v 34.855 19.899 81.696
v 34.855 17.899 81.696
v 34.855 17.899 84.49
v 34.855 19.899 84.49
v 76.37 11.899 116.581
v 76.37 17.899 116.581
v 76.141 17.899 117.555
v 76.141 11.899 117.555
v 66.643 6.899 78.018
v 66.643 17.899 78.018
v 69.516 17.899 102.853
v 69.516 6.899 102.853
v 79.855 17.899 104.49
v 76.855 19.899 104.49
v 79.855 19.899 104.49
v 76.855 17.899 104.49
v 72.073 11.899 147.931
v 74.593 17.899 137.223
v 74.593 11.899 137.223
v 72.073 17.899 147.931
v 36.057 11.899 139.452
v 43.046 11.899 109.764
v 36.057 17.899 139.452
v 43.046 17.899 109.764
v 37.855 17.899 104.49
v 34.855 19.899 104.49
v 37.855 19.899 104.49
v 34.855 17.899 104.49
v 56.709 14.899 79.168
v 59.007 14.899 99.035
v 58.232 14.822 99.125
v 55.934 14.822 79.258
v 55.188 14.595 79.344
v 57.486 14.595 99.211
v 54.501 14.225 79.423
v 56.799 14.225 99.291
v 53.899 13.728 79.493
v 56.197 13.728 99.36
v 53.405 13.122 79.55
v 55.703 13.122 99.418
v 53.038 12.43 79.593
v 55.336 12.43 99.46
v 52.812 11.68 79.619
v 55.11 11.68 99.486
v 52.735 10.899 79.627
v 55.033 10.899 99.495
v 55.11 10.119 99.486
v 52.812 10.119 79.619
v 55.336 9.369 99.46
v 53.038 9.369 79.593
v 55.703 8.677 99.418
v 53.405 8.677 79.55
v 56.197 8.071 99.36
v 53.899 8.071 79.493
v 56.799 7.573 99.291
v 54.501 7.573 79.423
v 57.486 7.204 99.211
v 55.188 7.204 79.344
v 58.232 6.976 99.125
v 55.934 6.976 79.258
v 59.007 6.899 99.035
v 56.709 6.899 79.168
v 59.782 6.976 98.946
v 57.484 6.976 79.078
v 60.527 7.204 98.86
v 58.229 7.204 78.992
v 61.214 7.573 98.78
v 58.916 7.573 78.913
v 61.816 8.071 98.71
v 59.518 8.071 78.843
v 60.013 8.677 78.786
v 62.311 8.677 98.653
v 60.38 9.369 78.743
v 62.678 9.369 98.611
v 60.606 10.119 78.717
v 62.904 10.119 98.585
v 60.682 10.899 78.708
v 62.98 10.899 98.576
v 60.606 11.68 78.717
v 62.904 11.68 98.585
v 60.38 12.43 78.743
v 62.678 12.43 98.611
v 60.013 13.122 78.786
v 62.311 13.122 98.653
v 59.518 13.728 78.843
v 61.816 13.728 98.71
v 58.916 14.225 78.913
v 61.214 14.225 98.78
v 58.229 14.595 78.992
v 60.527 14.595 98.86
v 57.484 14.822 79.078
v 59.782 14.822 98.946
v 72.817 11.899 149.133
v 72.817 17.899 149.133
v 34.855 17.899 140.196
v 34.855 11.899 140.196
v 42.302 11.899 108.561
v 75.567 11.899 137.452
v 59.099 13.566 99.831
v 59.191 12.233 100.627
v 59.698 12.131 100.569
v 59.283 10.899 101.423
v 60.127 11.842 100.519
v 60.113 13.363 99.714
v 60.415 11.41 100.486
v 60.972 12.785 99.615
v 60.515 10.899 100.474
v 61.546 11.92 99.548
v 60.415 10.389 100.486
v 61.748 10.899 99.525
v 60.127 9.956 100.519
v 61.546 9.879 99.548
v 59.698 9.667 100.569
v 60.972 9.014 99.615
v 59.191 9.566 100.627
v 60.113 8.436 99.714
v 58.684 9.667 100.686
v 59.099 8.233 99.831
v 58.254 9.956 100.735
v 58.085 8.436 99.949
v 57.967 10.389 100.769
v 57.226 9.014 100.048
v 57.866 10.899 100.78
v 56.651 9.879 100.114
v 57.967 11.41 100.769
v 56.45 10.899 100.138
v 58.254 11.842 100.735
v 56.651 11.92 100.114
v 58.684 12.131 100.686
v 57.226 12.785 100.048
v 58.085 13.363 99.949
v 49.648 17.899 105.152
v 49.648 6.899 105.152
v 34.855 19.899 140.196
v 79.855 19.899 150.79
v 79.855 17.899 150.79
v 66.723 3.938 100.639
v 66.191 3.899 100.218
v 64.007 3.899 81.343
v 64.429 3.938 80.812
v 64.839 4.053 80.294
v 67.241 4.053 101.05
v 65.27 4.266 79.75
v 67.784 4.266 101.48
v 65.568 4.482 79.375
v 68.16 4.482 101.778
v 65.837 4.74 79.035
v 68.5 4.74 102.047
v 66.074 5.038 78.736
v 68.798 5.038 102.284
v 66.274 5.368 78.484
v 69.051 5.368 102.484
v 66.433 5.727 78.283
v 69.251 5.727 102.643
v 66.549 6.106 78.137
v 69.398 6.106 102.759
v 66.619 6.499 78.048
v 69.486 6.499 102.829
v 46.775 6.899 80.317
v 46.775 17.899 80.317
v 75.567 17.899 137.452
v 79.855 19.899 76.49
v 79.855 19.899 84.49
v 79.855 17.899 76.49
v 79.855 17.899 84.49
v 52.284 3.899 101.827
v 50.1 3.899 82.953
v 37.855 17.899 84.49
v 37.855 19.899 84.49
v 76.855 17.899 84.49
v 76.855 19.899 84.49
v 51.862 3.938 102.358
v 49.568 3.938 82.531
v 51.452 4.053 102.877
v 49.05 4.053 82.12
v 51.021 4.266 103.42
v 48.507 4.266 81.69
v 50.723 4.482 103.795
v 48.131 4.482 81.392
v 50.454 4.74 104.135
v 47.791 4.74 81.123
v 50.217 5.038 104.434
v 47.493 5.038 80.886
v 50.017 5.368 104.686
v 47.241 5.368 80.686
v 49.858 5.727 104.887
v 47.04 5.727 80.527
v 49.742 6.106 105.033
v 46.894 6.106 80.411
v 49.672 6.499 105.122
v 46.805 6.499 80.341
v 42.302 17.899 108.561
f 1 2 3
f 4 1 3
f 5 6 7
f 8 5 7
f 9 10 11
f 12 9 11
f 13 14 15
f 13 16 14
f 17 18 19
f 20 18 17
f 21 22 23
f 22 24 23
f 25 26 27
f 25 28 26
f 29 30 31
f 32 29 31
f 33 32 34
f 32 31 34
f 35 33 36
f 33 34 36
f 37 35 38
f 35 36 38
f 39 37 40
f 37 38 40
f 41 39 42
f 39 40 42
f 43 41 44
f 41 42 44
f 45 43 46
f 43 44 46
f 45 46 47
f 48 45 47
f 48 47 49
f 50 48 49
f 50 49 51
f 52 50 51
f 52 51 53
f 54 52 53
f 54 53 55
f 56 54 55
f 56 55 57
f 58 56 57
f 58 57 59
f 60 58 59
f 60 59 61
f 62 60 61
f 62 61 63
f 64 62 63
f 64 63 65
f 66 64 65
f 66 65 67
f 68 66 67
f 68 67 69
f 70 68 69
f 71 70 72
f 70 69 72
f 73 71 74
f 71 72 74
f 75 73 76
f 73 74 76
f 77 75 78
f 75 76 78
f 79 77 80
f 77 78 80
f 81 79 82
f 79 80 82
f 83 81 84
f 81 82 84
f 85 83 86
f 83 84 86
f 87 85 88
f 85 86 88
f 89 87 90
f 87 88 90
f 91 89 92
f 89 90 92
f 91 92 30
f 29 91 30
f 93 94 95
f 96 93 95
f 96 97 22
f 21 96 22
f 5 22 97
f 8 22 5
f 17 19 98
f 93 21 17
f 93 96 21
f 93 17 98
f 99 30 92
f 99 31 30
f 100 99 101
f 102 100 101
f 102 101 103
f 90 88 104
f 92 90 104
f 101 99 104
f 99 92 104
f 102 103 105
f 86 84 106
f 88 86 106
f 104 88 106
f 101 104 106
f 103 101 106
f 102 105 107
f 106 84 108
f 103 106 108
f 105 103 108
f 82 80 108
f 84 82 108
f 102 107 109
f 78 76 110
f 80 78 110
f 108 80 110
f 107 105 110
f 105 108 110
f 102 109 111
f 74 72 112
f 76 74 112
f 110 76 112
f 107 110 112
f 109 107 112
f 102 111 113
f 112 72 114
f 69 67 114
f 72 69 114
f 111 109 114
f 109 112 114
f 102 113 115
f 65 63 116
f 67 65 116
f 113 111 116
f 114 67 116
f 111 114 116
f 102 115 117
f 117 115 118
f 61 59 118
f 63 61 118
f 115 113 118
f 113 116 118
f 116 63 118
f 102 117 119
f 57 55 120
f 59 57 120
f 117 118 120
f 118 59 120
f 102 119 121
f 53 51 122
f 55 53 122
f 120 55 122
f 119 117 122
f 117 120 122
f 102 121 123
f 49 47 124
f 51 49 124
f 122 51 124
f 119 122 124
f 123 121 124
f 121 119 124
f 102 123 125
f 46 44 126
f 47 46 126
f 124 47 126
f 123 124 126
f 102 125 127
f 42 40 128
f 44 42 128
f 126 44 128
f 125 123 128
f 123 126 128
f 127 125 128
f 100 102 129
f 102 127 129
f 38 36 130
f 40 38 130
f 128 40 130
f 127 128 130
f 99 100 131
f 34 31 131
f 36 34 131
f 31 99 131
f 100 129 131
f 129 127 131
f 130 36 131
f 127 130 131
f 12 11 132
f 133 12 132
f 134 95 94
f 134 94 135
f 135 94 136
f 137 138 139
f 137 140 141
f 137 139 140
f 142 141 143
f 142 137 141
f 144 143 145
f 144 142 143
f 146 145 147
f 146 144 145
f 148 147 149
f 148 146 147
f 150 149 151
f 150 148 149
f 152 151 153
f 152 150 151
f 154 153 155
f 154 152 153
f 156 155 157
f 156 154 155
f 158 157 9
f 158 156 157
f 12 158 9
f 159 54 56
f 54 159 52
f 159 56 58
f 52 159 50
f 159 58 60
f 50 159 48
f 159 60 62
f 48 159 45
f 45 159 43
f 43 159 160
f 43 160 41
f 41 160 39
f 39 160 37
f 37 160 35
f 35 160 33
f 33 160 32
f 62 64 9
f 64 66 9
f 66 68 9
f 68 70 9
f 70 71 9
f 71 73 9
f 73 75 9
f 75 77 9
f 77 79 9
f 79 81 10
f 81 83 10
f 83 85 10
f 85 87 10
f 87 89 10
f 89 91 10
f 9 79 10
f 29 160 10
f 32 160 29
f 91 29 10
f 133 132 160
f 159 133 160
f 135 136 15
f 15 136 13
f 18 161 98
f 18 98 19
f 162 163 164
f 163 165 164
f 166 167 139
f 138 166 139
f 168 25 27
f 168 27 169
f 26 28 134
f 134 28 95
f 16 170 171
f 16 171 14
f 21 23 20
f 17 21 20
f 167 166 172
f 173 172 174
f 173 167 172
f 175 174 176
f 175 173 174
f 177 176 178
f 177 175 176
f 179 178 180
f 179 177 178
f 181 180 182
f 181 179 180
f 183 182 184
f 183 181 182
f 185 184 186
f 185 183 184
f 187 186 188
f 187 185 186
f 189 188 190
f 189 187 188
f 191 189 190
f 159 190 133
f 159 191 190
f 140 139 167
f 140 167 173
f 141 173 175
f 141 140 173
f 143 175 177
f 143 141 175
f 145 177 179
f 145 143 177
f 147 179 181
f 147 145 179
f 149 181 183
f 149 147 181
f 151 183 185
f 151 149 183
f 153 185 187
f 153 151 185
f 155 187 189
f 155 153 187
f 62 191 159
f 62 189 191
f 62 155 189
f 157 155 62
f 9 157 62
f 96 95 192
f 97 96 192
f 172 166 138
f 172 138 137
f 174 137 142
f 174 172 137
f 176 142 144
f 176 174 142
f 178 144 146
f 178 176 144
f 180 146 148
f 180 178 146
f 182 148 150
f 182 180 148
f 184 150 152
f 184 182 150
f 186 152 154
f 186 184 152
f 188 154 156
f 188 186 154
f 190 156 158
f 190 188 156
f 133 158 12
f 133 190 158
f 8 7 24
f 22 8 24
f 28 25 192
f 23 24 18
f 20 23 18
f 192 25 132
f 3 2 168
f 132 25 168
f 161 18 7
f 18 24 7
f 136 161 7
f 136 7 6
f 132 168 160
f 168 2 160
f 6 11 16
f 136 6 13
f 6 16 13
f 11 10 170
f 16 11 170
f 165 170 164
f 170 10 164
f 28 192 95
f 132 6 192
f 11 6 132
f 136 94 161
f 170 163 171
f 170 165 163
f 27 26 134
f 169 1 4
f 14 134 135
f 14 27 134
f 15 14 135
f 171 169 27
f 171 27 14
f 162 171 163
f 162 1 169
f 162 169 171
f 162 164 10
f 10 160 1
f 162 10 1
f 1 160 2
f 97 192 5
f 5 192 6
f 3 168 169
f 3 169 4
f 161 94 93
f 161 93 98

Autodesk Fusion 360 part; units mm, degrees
ref_plane "WorkPlane3" through (54.5653, 17.8993, 37.432) normal (0, 1, 0) x (-1, 0, 0)
sketch "Top part base" plane through (54.5653, 17.8993, 37.432) normal (0, 1, 0) x (1, 0, 0)
  line L0 (25.2893, -113.3578) -> (25.2893, -39.0578)
  line L1 (25.2893, -39.0578) -> (-19.7107, -44.2645)
  line L2 (-19.7107, -44.2645) -> (-19.7107, -102.7645)
  line L3 (-19.7107, -102.7645) -> (25.2893, -113.3578)
  line L4 (-30, 0) -> (100, 0) construction
  dimension "d112" = 45
  dimension "d113" = 58.5
  dimension "d114" = 74.3
  dimension "d115" = 6.6
extrude "Extrude9" add sketch "Top part base" along normal blind 2
sketch "Anchor" plane through (0, 17.8993, 0) normal (0, -1, 0) x (1, 0, 0)
  line L0 (79.8546, 150.7899) -> (34.8546, 140.1965)
  line L1 (34.8546, 140.1965) -> (34.8546, 81.6965)
  line L2 (34.8546, 81.6965) -> (79.8546, 76.4899)
  line L3 (79.8546, 76.4899) -> (79.8546, 150.7899)
  line L4 (11.5702, 84.3906) -> (87.0208, 75.6607) construction
  line L5 (46.7751, 80.3173) -> (66.6426, 78.0185)
  line L6 (66.6426, 78.0185) -> (69.516, 102.8529)
  line L7 (69.516, 102.8529) -> (49.6485, 105.1516)
  line L8 (49.6485, 105.1516) -> (46.7751, 80.3173)
  dimension "d86" = 90
  dimension "d87" = 90
  dimension "d88" = 90
  dimension "d89" = 12
  dimension "d90" = 20
  dimension "d91" = 25
extrude "Extrude10" add sketch "Anchor" along normal blind 14 contours L2 L5 L6 L7 L8
sketch "Stopper battery" plane through (0, 17.8993, 0) normal (0, -1, 0) x (1, 0, 0)
  line L0 (69.516, 102.8529) -> (66.6426, 78.0185)
  line L1 (66.6426, 78.0185) -> (79.8546, 76.4899)
  line L2 (79.8546, 76.4899) -> (79.8546, 150.7899)
  line L3 (79.8546, 150.7899) -> (34.8546, 140.1965)
  line L4 (34.8546, 140.1965) -> (34.8546, 81.6965)
  line L5 (34.8546, 81.6965) -> (46.7751, 80.3173)
  line L6 (46.7751, 80.3173) -> (49.6485, 105.1516)
  line L7 (49.6485, 105.1516) -> (69.516, 102.8529)
  line L8 (34.8546, 140.1965) -> (72.8169, 149.1331)
  line L9 (34.8546, 140.1965) -> (42.3018, 108.5613)
  line L10 (42.3018, 108.5613) -> (76.3705, 116.5813)
  line L11 (76.3705, 116.5813) -> (76.1414, 117.5547)
  line L12 (76.1414, 117.5547) -> (43.0461, 109.7638)
  line L13 (43.0461, 109.7638) -> (36.0572, 139.4523)
  line L14 (36.0572, 139.4523) -> (72.0727, 147.9306)
  line L15 (72.8169, 149.1331) -> (75.5667, 137.4524)
  line L16 (75.5667, 137.4524) -> (74.5933, 137.2233)
  line L17 (74.5933, 137.2233) -> (72.0727, 147.9306)
  dimension "d116" = 39
  dimension "d117" = 32.5
  dimension "d118" = 35
  dimension "d119" = 1
  dimension "d120" = 1
  dimension "d121" = 1
  dimension "d122" = 12
  dimension "d123" = 1
  dimension "d124" = 1
sketch "Anchor hole" plane through (9.7882, 0, 84.5968) normal (-0.1149, 0, -0.9934) x (0, 1, 0)
  line L0 (17.8993, 70.5339) -> (17.8993, 57.2337)
  line L1 (17.8993, 57.2337) -> (3.8993, 57.2337)
  line L2 (3.8993, 57.2337) -> (3.8993, 37.2337)
  line L3 (3.8993, 37.2337) -> (17.8993, 37.2337)
  line L4 (17.8993, 37.2337) -> (17.8993, 25.2337)
  line L5 (17.8993, 25.2337) -> (19.8993, 25.2337)
  line L6 (19.8993, 25.2337) -> (19.8993, 70.5339)
  line L7 (19.8993, 70.5339) -> (17.8993, 70.5339)
  circle A0 centre (10.8993, 47.2337) radius 4
  line L8 (19.8993, 47.2337) -> (3.8993, 47.2337) construction
  dimension "d109" = 8
  dimension "d110" = 7
hole "Hole3" at (56.7088, 10.8993, 79.1679) direction (0.1149, 0, 0.9934) diameter 8 depth 20 tip angle 118
extrude "Extrude12" add sketch "Stopper battery" along normal blind 6 contours L3 L8 L9 L10 L11 L12 L13 L14 L15 L16 L17
sketch "Strap holes" plane through (0, 17.8993, 0) normal (0, -1, 0) x (1, 0, 0)
  line L0 (72.8169, 149.1331) -> (75.5667, 137.4524)
  line L1 (75.5667, 137.4524) -> (74.5933, 137.2233)
  line L2 (74.5933, 137.2233) -> (72.0727, 147.9306)
  line L3 (72.0727, 147.9306) -> (36.0572, 139.4523)
  line L4 (36.0572, 139.4523) -> (43.0461, 109.7638)
  line L5 (43.0461, 109.7638) -> (76.1414, 117.5547)
  line L6 (76.1414, 117.5547) -> (76.3705, 116.5813)
  line L7 (76.3705, 116.5813) -> (42.3018, 108.5613)
  line L8 (42.3018, 108.5613) -> (34.8546, 140.1965)
  line L9 (34.8546, 140.1965) -> (34.8546, 81.6965)
  line L10 (34.8546, 81.6965) -> (46.7751, 80.3173)
  line L11 (46.7751, 80.3173) -> (49.6485, 105.1516)
  line L12 (49.6485, 105.1516) -> (69.516, 102.8529)
  line L13 (69.516, 102.8529) -> (66.6426, 78.0185)
  line L14 (66.6426, 78.0185) -> (79.8546, 76.4899)
  line L15 (79.8546, 76.4899) -> (79.8546, 150.7899)
  line L16 (79.8546, 150.7899) -> (72.8169, 149.1331)
  line L17 (34.8546, 104.4899) -> (37.8546, 104.4899)
  line L18 (37.8546, 104.4899) -> (37.8546, 84.4899)
  line L19 (37.8546, 84.4899) -> (34.8546, 84.4899)
  line L20 (34.8546, 84.4899) -> (34.8546, 104.4899)
  line L21 (76.8546, 104.4899) -> (79.8546, 104.4899)
  line L22 (79.8546, 104.4899) -> (79.8546, 84.4899)
  line L23 (79.8546, 84.4899) -> (76.8546, 84.4899)
  line L24 (76.8546, 84.4899) -> (76.8546, 104.4899)
  dimension "d127" = 20
  dimension "d128" = 8
  dimension "d129" = 3
extrude "Extrude13" cut sketch "Strap holes" against normal blind 10 contours L15 L21 L22 L23 L24 | L9 L17 L18 L19 L20
fillet "Fillet5" radius 3 4 edges at (59.5823, 3.8993, 104.0022) (68.0793, 3.8993, 90.4357) (48.2118, 3.8993, 92.7344) (56.7088, 3.8993, 79.1679)
